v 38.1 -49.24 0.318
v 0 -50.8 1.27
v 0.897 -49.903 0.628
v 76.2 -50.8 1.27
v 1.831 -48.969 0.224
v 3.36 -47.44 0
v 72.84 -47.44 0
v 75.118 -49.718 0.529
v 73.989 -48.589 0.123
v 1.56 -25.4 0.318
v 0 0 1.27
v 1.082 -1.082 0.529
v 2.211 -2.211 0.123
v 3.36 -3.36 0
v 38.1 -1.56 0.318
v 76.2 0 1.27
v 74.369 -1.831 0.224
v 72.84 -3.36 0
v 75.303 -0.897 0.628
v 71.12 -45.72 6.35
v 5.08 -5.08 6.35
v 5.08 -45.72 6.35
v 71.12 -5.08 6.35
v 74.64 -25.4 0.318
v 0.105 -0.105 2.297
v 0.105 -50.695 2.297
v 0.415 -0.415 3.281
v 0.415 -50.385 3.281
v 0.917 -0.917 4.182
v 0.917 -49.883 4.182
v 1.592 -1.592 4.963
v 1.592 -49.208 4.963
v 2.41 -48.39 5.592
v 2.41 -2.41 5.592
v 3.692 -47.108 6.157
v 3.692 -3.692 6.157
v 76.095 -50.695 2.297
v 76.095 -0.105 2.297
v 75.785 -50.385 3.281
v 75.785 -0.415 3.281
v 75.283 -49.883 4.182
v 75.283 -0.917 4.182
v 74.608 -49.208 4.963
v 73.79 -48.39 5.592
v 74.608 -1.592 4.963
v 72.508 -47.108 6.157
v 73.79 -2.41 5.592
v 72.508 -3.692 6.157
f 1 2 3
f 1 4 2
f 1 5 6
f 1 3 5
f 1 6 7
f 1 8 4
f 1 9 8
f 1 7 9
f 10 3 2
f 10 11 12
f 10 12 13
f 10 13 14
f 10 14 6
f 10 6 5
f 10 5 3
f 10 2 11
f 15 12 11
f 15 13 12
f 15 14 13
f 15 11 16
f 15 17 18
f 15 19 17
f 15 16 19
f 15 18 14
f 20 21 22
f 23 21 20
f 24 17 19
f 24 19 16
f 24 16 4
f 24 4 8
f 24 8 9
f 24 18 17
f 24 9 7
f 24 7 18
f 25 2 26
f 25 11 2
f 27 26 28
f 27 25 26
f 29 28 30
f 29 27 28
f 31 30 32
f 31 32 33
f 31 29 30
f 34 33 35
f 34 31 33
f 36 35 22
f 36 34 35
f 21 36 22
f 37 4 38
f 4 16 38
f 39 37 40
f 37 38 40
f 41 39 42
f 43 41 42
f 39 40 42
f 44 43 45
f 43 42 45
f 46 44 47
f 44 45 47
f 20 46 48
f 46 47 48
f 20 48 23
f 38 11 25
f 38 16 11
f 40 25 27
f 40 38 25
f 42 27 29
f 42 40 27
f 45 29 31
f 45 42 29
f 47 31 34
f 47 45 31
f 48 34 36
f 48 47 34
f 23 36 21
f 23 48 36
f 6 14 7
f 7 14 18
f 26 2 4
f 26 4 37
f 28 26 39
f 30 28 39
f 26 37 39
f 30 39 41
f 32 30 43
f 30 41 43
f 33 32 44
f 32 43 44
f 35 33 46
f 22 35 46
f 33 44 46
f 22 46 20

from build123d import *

# Parameters (mm, degrees)
F0_W        = 76.2
F0_H        = 50.8
F1_DEPTH    = 6.35
F2_R        = 5.08
F3_T1_DEPTH = 93.0005208253
F3_T3_DEPTH = 67.6005208253


# Not quite as in the source:
# - a fillet or chamfer that OpenCascade refuses, or shapes differently, is made with other operations: its cross-section is extruded or revolved along the edge and cut away or added


with BuildPart() as f1:
    # F0 (on Top) → F1 (new body)
    with BuildSketch(Plane.XY):
        with Locations((38.1, -25.4)):
            Rectangle(F0_W, F0_H)
    extrude(amount=F1_DEPTH)

    # F2
    f2_edges = [f1.edges().sort_by_distance(p)[0] for p in [
        (38.1, 0, 6.35),
        (0, -25.4, 6.35),
        (38.1, -50.8, 6.35),
        (76.2, -25.4, 6.35),
    ]]
    fillet(f2_edges, radius=F2_R)

    # F3: fillet of radius 5.08 on 4 edges, made by hand

    # F3_s2 → F3_t1 (cut)
    with BuildSketch(Plane.YZ.offset(-8.4002604126)):
        with BuildLine():
            add(Edge.make_bspline(
                [(0, 1.27), (-1.4400446422, 0), (-3.3601041651, 0)],
                knots=[0, 0, 0, 1, 1, 1], degree=2, weights=[1, 1, 1]))
            Line((-3.3601041651, 0), (0, 0))
            Line((0, 0), (0, 1.27))
        make_face()
        with BuildLine():
            add(Edge.make_bspline(
                [(-47.4398958349, 0), (-49.3599553578, 0), (-50.8, 1.27)],
                knots=[0, 0, 0, 1, 1, 1], degree=2, weights=[1, 1, 1]))
            Line((-50.8, 1.27), (-50.8, 0))
            Line((-50.8, 0), (-47.4398958349, 0))
        make_face()
    extrude(amount=F3_T1_DEPTH, mode=Mode.SUBTRACT)

    # F3_s4 → F3_t3 (cut)
    with BuildSketch(Plane.XZ.offset(-8.4002604126)):
        with BuildLine():
            add(Edge.make_bspline(
                [(3.3601041651, 0), (1.4400446422, 0), (0, 1.27)],
                knots=[0, 0, 0, 1, 1, 1], degree=2, weights=[1, 1, 1]))
            Line((0, 1.27), (0, 0))
            Line((0, 0), (3.3601041651, 0))
        make_face()
        with BuildLine():
            add(Edge.make_bspline(
                [(76.2, 1.27), (74.7599553578, 0), (72.8398958349, 0)],
                knots=[0, 0, 0, 1, 1, 1], degree=2, weights=[1, 1, 1]))
            Line((72.8398958349, 0), (76.2, 0))
            Line((76.2, 0), (76.2, 1.27))
        make_face()
    extrude(amount=F3_T3_DEPTH, mode=Mode.SUBTRACT)


solid = f1.part
